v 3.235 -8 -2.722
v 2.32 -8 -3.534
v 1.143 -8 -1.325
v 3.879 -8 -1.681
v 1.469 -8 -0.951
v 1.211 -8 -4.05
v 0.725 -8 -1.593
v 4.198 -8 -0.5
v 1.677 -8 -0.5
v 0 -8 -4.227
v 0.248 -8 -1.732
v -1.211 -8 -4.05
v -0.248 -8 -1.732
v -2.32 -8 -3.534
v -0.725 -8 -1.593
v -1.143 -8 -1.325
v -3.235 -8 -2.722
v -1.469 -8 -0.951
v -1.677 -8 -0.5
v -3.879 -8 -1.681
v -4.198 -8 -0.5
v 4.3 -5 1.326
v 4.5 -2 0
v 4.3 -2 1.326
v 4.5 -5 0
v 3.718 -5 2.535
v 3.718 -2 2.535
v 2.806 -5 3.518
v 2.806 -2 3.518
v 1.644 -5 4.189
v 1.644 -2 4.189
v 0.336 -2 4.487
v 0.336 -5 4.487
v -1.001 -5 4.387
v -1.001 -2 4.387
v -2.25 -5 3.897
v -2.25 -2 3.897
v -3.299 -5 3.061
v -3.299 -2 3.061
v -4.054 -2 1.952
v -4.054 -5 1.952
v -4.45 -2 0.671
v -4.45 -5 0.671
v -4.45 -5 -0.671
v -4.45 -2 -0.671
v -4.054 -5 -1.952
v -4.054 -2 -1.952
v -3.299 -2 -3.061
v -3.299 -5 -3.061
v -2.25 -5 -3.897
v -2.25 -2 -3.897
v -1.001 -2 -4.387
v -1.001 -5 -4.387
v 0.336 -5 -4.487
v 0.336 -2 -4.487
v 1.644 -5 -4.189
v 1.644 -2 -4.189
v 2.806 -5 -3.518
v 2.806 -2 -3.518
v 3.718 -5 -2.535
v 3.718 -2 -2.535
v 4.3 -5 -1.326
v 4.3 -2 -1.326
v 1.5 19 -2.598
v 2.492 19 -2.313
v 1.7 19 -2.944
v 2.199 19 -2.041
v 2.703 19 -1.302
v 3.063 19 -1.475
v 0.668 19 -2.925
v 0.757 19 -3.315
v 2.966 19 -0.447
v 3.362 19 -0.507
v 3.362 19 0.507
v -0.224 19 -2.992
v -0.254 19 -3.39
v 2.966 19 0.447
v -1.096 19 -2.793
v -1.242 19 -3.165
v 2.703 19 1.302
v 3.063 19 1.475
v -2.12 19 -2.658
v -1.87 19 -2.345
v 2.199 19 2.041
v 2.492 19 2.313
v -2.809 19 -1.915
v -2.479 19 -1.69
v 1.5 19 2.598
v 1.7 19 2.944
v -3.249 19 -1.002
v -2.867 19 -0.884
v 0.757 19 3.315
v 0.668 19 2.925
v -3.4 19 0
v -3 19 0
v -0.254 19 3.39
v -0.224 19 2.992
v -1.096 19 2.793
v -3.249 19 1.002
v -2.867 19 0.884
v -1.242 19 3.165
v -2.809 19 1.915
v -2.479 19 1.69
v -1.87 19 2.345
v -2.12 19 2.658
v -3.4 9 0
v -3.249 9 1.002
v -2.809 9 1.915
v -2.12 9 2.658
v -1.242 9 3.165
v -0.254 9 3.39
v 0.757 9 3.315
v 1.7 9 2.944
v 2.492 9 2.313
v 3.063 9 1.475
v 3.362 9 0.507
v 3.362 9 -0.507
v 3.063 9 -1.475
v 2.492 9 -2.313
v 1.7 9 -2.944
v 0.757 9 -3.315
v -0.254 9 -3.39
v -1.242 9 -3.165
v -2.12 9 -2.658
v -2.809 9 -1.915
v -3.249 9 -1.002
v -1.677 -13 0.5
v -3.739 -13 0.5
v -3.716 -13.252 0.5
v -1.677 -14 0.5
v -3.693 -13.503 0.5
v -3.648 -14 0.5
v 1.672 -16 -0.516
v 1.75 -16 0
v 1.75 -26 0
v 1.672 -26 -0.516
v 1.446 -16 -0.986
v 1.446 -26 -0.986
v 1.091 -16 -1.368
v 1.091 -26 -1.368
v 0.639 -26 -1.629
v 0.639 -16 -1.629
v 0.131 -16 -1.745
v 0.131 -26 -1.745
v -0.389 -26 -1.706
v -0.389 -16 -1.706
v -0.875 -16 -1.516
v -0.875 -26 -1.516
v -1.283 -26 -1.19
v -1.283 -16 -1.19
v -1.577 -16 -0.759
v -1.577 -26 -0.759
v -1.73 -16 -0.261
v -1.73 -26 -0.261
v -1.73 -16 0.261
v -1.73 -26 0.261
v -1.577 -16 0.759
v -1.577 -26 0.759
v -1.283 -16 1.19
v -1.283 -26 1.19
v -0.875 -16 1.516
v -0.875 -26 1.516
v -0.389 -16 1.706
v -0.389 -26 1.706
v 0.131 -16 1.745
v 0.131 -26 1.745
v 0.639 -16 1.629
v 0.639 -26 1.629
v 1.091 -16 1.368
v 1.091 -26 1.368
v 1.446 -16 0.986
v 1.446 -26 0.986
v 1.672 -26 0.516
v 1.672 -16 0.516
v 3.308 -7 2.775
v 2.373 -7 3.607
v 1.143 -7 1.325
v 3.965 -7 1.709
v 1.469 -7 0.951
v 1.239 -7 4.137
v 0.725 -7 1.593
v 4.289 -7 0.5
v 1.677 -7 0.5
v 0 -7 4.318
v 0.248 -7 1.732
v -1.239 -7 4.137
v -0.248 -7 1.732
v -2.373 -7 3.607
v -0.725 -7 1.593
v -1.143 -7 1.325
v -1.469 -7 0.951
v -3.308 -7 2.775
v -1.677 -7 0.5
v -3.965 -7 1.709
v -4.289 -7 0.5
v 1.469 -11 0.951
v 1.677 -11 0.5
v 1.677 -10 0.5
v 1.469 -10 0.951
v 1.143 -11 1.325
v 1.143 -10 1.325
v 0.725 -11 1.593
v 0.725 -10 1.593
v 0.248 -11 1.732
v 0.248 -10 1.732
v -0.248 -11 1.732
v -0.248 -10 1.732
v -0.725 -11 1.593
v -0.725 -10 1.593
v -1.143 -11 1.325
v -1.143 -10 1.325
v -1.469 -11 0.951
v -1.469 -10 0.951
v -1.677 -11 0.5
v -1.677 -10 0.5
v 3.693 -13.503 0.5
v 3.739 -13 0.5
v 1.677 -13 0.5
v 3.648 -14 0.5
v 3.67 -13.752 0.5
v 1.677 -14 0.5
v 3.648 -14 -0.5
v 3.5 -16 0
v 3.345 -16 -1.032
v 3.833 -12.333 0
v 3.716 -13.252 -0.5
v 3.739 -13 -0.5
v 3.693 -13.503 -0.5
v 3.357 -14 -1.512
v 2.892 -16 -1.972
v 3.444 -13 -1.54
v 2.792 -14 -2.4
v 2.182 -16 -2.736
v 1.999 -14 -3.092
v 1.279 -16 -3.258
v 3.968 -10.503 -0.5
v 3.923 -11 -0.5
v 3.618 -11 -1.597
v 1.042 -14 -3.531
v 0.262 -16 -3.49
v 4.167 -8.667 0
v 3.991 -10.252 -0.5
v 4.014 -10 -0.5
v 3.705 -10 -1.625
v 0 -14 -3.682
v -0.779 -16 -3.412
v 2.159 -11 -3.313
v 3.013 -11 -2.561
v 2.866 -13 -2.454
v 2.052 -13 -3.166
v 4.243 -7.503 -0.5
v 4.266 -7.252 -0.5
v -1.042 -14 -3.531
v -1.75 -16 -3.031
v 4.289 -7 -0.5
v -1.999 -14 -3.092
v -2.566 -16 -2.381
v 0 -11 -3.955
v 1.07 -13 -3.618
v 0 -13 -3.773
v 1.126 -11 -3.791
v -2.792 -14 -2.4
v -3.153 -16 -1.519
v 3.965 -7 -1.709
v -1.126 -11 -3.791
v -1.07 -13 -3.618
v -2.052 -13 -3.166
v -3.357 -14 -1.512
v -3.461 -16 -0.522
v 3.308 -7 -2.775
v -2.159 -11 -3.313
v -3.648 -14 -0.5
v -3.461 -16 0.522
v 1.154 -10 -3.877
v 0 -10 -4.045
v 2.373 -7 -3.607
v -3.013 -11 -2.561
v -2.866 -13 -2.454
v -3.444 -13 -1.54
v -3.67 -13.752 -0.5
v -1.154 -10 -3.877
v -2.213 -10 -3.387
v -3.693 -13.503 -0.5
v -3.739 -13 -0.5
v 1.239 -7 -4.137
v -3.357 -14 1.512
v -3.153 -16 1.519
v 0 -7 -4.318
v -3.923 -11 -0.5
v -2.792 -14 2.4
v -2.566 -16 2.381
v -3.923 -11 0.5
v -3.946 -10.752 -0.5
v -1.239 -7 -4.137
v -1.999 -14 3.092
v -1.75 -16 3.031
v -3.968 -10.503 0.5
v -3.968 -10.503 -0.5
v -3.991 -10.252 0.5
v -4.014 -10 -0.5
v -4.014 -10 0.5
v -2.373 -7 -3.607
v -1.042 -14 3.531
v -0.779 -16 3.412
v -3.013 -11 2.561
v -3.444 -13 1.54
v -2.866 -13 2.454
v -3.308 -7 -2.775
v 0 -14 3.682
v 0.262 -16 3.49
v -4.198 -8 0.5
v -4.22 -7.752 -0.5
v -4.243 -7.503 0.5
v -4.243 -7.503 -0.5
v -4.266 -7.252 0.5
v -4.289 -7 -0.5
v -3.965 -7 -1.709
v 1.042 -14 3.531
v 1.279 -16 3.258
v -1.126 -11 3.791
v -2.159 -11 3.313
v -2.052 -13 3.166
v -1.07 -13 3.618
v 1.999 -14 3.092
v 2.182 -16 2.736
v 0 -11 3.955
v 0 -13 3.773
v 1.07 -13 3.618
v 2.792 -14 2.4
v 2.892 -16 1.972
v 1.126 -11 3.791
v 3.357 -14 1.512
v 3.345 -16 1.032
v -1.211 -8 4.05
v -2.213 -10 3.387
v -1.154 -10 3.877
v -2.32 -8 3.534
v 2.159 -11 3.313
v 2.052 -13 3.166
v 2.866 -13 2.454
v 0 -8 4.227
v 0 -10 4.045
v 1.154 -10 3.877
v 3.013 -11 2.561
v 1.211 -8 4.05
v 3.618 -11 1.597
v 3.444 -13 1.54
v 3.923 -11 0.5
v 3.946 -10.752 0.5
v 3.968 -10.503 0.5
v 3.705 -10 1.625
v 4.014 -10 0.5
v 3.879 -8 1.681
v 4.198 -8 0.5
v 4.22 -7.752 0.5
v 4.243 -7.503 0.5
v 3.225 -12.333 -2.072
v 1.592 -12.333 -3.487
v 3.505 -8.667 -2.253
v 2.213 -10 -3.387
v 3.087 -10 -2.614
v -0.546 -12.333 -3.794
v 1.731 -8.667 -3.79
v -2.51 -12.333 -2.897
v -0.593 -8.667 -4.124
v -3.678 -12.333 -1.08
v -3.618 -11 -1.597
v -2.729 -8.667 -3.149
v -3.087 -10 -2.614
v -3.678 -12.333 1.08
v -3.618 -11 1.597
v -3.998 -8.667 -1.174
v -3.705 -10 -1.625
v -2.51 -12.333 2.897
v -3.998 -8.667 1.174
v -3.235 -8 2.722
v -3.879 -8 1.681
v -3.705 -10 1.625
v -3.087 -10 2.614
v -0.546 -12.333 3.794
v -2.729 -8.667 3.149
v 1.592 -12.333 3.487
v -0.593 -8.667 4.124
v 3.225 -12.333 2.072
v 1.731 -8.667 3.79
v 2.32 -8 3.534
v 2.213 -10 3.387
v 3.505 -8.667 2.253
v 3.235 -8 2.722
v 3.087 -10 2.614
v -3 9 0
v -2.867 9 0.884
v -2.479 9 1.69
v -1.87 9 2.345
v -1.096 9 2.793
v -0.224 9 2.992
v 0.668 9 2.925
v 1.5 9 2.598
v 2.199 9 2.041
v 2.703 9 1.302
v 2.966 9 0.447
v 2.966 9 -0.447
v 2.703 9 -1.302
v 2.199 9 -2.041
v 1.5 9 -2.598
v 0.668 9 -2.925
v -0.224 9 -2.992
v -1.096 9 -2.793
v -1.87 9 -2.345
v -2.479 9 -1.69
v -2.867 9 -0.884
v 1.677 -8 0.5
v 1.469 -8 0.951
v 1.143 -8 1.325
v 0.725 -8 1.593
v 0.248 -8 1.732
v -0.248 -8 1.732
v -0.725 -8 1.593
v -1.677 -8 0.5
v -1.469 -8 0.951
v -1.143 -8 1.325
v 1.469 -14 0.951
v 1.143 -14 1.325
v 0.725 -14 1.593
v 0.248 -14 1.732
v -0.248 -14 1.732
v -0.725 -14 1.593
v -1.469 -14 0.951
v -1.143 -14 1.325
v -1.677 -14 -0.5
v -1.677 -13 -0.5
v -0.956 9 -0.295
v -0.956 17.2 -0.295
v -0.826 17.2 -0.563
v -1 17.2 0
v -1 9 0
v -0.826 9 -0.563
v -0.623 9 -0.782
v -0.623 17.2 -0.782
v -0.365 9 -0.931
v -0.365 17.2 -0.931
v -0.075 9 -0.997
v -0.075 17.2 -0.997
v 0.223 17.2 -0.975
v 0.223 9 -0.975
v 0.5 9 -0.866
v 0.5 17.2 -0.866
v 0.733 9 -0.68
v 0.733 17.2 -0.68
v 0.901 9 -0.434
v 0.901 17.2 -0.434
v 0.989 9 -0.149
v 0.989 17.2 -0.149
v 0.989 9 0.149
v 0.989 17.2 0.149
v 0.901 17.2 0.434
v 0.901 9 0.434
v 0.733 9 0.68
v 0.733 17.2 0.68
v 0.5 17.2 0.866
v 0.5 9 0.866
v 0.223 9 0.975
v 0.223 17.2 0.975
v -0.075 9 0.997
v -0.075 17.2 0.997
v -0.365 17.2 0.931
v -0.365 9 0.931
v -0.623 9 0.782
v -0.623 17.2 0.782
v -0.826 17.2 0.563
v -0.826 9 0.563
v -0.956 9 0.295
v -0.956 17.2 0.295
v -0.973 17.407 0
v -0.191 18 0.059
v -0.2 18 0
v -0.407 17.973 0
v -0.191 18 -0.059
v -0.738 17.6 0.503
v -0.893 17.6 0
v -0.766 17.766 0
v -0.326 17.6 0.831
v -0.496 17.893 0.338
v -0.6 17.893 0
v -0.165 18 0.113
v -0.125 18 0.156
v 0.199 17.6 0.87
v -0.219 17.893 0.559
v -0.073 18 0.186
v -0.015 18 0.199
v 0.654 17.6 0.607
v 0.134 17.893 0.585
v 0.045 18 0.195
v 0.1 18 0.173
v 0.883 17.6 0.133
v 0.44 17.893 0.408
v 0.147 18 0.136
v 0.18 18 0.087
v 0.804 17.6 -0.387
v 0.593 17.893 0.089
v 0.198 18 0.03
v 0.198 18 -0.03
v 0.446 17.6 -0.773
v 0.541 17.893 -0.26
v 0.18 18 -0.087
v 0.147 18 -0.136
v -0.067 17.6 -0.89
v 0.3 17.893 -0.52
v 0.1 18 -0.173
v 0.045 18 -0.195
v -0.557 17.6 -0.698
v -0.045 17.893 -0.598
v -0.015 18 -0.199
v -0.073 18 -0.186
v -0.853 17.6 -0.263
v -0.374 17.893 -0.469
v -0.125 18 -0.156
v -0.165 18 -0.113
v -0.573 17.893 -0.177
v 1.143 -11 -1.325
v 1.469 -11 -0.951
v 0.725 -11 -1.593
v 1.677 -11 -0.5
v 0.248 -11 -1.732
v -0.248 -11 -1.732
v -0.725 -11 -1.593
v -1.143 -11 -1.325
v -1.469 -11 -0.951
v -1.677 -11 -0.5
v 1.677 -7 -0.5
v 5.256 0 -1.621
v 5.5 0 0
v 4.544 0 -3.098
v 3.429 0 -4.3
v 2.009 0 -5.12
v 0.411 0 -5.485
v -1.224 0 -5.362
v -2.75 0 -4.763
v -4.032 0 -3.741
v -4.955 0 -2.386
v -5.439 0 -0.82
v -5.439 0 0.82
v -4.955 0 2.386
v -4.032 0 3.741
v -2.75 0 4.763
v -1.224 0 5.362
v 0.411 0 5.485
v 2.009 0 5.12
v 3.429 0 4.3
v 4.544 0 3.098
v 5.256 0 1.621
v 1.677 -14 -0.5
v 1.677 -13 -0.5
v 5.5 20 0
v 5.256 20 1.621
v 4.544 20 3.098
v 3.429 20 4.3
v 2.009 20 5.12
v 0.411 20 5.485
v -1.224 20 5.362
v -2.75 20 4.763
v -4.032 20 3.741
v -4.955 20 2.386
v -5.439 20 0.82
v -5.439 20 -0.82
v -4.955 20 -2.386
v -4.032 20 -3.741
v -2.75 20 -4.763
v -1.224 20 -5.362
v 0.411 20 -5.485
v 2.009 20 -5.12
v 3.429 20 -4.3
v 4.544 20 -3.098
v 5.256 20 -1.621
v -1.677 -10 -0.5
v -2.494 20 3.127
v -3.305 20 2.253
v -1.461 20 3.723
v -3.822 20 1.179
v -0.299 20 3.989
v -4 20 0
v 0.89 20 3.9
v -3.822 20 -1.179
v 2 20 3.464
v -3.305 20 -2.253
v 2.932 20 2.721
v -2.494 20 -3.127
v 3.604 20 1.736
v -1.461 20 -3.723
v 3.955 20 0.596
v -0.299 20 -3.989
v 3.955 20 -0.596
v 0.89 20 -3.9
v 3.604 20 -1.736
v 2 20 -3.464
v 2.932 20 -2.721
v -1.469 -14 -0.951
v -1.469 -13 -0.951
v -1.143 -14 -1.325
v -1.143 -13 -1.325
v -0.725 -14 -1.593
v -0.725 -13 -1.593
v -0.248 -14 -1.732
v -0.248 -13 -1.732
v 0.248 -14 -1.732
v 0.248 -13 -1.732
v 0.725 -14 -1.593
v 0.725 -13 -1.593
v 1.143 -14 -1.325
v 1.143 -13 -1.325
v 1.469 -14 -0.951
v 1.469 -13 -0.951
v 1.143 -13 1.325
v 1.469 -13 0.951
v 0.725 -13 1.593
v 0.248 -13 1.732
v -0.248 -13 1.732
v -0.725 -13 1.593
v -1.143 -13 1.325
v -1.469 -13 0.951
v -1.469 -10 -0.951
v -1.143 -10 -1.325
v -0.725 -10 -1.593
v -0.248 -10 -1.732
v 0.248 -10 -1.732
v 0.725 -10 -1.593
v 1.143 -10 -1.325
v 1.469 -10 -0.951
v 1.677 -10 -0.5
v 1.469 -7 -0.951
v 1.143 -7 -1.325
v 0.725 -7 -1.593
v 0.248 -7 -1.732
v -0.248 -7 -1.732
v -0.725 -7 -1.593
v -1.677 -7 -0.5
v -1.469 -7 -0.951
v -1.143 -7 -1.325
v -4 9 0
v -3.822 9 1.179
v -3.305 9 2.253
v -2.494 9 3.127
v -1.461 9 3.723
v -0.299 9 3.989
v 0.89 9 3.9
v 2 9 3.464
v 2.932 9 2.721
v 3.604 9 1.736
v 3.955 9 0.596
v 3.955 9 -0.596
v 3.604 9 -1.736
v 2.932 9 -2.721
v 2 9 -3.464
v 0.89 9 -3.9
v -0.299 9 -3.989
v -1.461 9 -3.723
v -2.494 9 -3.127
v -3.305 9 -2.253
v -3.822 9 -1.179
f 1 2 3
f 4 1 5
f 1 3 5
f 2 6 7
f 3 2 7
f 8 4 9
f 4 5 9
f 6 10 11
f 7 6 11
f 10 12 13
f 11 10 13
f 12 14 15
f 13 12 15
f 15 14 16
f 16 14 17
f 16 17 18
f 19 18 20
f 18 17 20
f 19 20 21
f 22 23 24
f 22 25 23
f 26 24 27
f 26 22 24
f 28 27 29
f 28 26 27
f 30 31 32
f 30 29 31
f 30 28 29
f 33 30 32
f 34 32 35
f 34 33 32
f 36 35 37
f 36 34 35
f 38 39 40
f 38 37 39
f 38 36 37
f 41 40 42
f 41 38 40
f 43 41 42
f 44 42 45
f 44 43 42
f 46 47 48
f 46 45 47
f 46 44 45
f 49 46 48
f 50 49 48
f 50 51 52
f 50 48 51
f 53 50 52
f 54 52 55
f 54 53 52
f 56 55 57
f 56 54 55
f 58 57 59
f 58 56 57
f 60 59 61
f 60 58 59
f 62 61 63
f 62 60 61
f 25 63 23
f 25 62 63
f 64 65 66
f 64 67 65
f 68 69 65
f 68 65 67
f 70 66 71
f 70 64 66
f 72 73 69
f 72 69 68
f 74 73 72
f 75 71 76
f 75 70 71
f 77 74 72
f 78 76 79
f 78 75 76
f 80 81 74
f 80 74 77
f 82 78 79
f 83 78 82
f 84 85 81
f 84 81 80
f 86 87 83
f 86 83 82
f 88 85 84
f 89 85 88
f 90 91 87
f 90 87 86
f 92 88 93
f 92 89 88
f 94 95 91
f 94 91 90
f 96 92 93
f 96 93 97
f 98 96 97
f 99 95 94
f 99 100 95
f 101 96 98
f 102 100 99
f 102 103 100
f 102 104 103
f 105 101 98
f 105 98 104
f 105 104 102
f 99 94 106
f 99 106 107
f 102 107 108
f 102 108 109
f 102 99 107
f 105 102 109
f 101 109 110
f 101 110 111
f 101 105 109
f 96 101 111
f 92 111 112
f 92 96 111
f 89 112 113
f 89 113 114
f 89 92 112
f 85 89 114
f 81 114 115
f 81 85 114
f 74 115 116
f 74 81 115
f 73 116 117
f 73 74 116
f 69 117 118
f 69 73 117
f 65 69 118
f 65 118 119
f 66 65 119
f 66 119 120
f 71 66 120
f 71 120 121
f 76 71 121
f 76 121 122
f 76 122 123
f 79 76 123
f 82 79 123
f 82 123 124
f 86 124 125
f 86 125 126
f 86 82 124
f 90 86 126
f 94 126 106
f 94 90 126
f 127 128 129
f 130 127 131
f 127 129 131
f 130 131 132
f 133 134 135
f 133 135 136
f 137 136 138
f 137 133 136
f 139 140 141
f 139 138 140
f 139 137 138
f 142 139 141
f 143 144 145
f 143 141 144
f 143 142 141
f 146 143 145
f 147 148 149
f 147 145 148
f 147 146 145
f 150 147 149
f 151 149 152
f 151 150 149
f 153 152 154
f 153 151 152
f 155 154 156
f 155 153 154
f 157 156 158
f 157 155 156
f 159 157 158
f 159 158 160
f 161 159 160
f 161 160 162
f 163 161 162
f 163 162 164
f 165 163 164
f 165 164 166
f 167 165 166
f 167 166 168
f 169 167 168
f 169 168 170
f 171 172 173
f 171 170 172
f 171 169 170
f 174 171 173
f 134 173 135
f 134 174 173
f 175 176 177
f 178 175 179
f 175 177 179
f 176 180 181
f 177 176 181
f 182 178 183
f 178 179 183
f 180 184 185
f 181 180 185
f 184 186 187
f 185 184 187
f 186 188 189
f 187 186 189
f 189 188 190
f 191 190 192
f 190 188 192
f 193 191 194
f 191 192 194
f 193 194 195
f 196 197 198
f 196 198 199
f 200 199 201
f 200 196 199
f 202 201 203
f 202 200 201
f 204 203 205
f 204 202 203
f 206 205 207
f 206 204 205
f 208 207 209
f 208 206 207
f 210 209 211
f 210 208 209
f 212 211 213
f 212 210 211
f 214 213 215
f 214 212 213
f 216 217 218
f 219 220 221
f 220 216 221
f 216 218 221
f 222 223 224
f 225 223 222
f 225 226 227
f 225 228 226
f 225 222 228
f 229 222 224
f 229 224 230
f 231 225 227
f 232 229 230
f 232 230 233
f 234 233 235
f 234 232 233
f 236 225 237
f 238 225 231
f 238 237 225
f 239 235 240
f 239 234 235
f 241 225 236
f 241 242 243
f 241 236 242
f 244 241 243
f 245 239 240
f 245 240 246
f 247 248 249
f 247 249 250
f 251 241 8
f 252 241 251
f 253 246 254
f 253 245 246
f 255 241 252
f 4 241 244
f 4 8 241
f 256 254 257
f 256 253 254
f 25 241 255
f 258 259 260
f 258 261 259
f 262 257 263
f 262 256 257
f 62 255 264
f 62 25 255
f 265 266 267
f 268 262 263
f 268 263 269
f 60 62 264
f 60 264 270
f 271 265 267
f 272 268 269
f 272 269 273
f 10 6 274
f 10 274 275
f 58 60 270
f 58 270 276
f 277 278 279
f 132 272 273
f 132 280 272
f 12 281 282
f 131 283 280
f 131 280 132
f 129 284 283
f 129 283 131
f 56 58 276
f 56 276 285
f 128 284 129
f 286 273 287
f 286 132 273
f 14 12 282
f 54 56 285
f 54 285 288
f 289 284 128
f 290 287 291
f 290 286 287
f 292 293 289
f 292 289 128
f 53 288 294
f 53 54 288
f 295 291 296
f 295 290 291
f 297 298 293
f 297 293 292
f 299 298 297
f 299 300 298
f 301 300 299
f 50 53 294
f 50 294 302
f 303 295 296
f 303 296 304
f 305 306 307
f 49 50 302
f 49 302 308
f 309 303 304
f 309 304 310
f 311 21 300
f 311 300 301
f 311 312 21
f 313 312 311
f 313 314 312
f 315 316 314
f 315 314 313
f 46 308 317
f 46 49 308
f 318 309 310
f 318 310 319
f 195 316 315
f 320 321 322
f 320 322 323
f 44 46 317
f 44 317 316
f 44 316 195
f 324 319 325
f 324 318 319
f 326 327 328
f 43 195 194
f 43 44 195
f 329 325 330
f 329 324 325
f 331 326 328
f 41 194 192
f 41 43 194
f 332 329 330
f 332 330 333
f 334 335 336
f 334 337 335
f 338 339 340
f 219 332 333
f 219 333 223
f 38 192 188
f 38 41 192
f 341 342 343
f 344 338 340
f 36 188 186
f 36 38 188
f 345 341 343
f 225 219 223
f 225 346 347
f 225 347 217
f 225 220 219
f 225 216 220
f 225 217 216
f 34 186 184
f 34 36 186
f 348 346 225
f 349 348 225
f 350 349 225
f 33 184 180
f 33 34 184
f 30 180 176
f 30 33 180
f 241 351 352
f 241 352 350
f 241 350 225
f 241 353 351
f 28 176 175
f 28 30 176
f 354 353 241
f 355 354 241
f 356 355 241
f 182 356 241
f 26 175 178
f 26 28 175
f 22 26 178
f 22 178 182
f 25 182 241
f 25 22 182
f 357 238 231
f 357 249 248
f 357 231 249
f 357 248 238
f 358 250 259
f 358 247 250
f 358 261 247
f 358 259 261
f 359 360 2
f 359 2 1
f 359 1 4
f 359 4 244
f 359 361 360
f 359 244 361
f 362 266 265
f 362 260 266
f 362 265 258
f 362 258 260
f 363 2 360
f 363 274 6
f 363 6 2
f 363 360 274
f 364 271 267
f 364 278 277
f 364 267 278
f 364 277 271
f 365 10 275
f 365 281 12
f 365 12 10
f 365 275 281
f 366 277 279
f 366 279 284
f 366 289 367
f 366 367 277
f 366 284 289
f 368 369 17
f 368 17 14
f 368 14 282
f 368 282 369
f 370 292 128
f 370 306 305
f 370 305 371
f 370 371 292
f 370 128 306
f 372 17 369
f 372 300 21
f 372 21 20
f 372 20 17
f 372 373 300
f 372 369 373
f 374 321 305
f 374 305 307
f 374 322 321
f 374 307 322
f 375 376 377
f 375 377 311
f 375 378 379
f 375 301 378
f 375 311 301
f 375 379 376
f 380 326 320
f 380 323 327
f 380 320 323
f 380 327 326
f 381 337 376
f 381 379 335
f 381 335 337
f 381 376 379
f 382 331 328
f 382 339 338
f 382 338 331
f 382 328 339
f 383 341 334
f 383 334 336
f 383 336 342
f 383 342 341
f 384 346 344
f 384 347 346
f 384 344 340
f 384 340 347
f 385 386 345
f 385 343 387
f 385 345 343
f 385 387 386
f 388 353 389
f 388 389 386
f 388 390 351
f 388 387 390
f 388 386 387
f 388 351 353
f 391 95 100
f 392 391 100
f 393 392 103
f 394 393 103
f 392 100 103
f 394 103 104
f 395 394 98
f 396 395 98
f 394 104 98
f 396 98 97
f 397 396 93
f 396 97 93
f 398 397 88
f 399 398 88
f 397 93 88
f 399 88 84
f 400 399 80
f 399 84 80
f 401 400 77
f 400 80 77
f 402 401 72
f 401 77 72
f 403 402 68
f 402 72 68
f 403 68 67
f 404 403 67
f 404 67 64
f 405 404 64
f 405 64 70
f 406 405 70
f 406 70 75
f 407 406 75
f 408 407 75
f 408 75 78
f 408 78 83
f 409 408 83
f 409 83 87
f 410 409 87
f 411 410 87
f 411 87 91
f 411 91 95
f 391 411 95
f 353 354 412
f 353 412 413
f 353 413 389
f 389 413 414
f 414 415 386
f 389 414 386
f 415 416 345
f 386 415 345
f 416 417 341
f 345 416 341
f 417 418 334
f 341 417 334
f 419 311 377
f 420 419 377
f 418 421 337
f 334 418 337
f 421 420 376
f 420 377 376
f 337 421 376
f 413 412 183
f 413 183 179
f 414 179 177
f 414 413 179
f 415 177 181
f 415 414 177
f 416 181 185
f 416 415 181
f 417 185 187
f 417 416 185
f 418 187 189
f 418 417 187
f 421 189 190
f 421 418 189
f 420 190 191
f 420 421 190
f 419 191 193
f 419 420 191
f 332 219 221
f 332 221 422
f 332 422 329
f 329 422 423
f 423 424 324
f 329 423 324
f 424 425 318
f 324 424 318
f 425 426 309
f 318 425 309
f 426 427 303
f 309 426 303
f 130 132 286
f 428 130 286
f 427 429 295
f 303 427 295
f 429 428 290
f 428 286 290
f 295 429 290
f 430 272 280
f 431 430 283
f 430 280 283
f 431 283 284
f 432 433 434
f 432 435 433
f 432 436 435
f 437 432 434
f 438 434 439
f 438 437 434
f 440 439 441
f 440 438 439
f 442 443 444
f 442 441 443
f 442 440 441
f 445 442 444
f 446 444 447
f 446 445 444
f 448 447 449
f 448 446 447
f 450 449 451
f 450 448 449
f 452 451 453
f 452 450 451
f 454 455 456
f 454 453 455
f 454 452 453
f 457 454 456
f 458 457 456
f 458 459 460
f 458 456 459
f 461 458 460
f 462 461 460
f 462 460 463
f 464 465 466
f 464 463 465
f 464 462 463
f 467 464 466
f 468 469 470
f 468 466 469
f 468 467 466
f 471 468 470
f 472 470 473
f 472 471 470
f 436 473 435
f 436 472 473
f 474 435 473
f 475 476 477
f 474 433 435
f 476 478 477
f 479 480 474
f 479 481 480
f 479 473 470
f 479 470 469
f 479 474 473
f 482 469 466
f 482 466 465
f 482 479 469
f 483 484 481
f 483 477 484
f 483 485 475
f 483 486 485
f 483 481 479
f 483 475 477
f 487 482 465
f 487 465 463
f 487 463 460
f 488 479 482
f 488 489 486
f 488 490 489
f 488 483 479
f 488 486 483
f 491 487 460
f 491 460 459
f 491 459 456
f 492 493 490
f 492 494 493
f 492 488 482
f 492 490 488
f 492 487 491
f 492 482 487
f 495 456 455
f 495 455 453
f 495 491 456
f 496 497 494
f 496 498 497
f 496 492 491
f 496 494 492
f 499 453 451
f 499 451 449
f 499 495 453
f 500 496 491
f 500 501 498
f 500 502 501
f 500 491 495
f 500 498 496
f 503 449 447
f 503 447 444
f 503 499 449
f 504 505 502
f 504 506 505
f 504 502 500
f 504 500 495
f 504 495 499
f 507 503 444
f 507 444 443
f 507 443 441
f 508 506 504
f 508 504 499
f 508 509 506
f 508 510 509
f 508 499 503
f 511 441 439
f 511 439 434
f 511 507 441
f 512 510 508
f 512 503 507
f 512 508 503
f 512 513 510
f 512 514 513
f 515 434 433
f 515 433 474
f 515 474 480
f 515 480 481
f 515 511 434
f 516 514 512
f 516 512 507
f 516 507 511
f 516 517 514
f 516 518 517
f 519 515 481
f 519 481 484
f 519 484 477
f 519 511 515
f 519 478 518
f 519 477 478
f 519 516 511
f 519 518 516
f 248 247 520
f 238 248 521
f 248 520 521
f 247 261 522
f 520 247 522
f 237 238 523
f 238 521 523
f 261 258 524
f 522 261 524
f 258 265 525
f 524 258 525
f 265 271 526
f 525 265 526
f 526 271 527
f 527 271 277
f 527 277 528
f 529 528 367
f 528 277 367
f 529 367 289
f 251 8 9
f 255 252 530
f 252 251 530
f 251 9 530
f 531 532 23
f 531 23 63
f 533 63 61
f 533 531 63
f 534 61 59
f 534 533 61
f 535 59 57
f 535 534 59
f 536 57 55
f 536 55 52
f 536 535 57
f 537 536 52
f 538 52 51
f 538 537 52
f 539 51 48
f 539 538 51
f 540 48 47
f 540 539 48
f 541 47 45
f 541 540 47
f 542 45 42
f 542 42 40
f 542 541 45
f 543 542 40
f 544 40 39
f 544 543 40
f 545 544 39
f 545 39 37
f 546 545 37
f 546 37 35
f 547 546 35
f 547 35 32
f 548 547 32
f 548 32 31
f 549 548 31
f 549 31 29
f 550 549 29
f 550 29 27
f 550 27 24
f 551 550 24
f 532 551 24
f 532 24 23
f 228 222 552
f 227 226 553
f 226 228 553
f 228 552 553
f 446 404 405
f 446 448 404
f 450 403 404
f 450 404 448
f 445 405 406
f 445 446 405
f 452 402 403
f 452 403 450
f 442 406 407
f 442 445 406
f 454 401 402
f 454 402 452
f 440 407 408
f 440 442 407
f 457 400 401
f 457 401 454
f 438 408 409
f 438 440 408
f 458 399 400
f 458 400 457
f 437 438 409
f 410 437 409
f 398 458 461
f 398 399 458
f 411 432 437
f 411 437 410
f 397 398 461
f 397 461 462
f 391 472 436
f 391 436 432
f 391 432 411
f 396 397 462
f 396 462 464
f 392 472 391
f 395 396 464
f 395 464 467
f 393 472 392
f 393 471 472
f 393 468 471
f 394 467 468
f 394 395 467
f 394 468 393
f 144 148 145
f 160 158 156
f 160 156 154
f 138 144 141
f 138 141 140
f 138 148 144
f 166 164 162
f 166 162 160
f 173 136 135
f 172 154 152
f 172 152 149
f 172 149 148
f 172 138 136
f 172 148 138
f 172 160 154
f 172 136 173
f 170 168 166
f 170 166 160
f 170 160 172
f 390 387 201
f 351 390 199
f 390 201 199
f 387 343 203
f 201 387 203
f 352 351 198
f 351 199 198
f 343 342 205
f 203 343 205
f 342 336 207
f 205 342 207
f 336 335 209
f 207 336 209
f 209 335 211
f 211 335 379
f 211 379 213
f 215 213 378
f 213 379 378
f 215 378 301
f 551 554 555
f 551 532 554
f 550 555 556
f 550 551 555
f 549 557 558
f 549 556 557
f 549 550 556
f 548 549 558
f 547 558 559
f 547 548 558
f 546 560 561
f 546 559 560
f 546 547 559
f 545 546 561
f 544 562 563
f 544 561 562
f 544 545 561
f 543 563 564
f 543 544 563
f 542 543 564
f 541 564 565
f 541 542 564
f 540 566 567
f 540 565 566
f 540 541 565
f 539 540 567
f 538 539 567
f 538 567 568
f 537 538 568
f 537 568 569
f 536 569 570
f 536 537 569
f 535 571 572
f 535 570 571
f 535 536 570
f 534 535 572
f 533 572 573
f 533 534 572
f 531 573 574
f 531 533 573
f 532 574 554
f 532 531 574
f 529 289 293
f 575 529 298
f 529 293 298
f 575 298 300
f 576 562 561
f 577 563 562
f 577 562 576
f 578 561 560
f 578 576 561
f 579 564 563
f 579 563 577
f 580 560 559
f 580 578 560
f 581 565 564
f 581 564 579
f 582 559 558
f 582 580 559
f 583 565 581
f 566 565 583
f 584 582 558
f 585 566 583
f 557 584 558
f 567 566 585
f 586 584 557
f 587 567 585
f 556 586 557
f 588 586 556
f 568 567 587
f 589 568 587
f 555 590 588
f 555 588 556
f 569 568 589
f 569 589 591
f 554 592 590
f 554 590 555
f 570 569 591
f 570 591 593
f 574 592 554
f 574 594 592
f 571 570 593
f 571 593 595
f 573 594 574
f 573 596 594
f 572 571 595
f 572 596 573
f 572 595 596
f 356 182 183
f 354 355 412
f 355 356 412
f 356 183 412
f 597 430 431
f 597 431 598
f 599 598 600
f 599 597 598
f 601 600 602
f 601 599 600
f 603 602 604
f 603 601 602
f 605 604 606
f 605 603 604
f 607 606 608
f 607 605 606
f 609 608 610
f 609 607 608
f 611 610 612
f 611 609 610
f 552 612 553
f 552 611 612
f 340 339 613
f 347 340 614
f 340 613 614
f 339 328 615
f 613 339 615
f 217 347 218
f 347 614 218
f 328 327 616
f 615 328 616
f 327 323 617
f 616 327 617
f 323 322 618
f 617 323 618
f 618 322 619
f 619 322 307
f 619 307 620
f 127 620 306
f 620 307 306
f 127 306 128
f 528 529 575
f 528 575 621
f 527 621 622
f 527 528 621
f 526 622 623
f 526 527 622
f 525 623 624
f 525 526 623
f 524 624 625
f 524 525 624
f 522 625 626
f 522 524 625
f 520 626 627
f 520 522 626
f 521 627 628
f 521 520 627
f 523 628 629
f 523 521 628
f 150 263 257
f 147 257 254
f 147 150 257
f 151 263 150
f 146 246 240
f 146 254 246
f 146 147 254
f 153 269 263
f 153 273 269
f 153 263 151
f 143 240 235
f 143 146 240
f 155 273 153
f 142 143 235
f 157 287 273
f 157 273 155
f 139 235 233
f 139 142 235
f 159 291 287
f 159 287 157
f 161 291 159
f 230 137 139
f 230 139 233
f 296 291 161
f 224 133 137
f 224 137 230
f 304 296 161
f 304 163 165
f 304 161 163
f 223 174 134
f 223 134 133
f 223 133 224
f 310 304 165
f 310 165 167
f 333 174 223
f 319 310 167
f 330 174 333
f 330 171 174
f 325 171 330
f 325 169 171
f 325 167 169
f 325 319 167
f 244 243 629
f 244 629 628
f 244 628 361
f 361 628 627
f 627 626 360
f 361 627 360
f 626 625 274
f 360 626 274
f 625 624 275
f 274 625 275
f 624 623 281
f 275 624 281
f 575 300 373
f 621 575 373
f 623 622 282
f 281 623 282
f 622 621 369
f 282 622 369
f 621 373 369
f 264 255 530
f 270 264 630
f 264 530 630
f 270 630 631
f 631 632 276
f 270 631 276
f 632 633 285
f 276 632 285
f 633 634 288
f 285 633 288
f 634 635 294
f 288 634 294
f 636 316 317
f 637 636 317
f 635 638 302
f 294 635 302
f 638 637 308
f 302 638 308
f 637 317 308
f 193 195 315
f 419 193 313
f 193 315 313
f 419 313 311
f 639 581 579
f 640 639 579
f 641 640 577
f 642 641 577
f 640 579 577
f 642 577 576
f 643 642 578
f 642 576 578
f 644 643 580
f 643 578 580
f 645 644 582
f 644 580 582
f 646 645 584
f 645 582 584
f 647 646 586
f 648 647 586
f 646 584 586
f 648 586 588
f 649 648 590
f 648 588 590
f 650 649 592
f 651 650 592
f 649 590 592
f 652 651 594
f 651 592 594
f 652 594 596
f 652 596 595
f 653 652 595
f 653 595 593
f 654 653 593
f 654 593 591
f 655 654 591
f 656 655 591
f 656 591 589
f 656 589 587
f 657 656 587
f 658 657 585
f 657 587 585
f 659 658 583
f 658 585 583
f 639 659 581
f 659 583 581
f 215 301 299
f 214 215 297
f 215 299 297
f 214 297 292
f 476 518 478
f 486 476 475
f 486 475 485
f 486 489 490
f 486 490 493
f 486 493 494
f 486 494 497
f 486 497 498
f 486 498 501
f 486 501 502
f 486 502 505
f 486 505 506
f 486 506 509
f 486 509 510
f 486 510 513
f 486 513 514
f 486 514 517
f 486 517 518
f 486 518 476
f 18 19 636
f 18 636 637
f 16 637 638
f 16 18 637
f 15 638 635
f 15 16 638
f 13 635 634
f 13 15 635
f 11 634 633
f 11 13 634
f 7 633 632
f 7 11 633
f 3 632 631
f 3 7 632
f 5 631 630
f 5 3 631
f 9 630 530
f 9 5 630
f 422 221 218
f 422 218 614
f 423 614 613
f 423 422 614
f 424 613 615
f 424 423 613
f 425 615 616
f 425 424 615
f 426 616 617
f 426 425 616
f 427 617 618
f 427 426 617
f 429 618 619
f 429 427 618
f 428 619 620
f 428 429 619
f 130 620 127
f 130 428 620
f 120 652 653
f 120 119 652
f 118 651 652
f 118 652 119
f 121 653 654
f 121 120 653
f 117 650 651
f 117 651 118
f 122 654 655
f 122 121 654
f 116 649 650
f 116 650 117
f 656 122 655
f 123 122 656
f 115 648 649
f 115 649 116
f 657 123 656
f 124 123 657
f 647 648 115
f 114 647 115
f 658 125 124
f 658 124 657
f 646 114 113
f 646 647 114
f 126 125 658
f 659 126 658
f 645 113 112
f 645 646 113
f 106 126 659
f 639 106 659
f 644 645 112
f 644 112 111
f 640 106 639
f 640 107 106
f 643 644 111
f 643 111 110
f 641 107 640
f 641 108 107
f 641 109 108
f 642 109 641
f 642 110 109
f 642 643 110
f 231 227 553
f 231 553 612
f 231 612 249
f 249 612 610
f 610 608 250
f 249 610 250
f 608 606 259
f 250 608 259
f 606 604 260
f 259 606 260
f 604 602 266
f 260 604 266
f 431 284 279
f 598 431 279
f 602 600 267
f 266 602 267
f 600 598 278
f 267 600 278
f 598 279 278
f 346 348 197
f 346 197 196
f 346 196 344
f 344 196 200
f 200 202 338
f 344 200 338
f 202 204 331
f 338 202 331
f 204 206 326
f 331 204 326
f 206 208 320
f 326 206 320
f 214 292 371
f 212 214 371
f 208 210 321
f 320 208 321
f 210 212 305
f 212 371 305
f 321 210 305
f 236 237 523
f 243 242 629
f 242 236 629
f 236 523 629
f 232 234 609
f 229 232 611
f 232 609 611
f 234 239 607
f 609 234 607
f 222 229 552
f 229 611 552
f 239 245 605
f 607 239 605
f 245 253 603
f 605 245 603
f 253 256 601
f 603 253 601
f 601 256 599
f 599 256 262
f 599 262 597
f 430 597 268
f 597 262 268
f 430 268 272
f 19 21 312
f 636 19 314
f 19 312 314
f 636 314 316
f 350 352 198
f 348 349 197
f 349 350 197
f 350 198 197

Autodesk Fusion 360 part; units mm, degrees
sketch "Sketch1" plane through (0, 0, 0) normal (0, 1, 0) x (1, 0, 0)
  circle A0 centre (0, 0) radius 5.5
  dimension "d1" = 11
ref_plane "WorkPlane1" through (0, 20, 0) normal (0, 1, 0) x (1, 0, 0)
sketch "Sketch2" plane through (0, 20, 0) normal (0, 1, 0) x (1, 0, 0)
  circle A0 centre (0, 0) radius 5.5
  dimension "d3" = 11
ref_plane "WorkPlane2" through (0, -2, 0) normal (0, 1, 0) x (1, 0, 0)
sketch "Sketch3" plane through (0, -2, 0) normal (0, 1, 0) x (1, 0, 0)
  circle A0 centre (0, 0) radius 4.5
  dimension "d5" = 9
ref_plane "WorkPlane3" through (0, -5, 0) normal (0, 1, 0) x (1, 0, 0)
sketch "Sketch4" plane through (0, -5, 0) normal (0, 1, 0) x (1, 0, 0)
  circle A0 centre (0, 0) radius 4.5
  dimension "d7" = 9
ref_plane "WorkPlane4" through (0, -16, 0) normal (0, 1, 0) x (1, 0, 0)
sketch "Sketch5" plane through (0, -16, 0) normal (0, 1, 0) x (1, 0, 0)
  circle A0 centre (0, 0) radius 3.5
  dimension "d9" = 7
loft "Loft1" add profiles "Sketch2", "Sketch1" section 1 section 2 makes body 1
loft "Loft2" add profiles "Sketch3" section 1 face at (-1.4907, 0, -0.2732) section 2 on bodies 1 bodies 1
loft "Loft3" add profiles "Sketch4" section 1 face at (0.9352, -2, -1.1727) section 2 on bodies 1 bodies 1
loft "Loft4" add profiles "Sketch5" section 1 face at (0.9352, -5, -1.1727) section 2 on bodies 1 bodies 1
sketch "Sketch6" plane through (0, 0, 0) normal (1, 0, 0) x (0, 1, 0)
  line L0 (-10.5, 5.5424) -> (-10.5, -7.5313)
  line L1 (-5, 0.5) -> (-16, 0.5)
  line L2 (-16, 0.5) -> (-16, -0.5)
  line L3 (-16, -0.5) -> (-5, -0.5)
  line L4 (-5, -0.5) -> (-5, 0.5)
  line L5 (-5, 0.5) -> (-16, -0.5) construction
  line L6 (-16, 0.5) -> (-5, -0.5) construction
  line L7 (-14, 5) -> (-13, 5)
  line L8 (-13, 5) -> (-13, -5)
  line L9 (-13, -5) -> (-14, -5)
  line L10 (-14, -5) -> (-14, 5)
  line L11 (-11, 5) -> (-10, 5)
  line L12 (-10, 5) -> (-10, -5)
  line L13 (-10, -5) -> (-11, -5)
  line L14 (-11, -5) -> (-11, 5)
  line L15 (-8, 5) -> (-7, 5)
  line L16 (-7, 5) -> (-7, -5)
  line L17 (-7, -5) -> (-8, -5)
  line L18 (-8, -5) -> (-8, 5)
  point P0 (-10.5, 0)
  point P1 (-10.5, 0)
  dimension "d10" = 11
  dimension "d11" = 1
extrude "Extrude1" cut sketch "Sketch6" along normal blind 5 and the other way blind 5 contours L0 L1 L11 L12 | L0 L1 L11 L14 | L0 L3 L12 L13 | L0 L3 L13 L14 | L1 L15 L16 L18 | L1 L7 L8 L10 | L3 L8 L9 L10 | L3 L16 L17 L18 bodies 1
sketch "Sketch7" plane through (0, -16, 0) normal (0, -1, 0) x (1, 0, 0)
  circle A0 centre (0, 0) radius 3.5
  circle A1 centre (0, 0) radius 1.75
  dimension "d16" = 3.5
extrude "Extrude2" add sketch "Sketch7" against normal blind 11 contours A1 bodies 1
sketch "Sketch8" plane through (0, 20, 0) normal (0, 1, 0) x (-1, 0, 0)
  circle A0 centre (0, 0) radius 5.5
  circle A1 centre (0, 0) radius 4
  dimension "d19" = 8
extrude "Extrude3" cut sketch "Sketch8" against normal blind 1 contours A1 bodies 1
sketch "Sketch9" plane through (0, 19, 0) normal (0, 1, 0) x (-1, 0, 0)
  circle A0 centre (0, 0) radius 4
  circle A1 centre (0, 0) radius 3
  circle A2 centre (0, 0) radius 3.4
  dimension "d22" = 6
  dimension "d23" = 6.8
extrude "Extrude4" cut sketch "Sketch9" against normal blind 10 bodies 1
sketch "Sketch10" plane through (0, 9, 0) normal (0, 1, 0) x (-1, 0, 0)
  circle A0 centre (0, 0) radius 3
  circle A1 centre (0, 0) radius 1
  dimension "d26" = 2
extrude "Extrude5" add sketch "Sketch10" along normal blind 9 contours A1 bodies 1
fillet "Fillet1" radius 0.8 1 edges at (0.9323, 18, -0.3616) on bodies 1
extrude "Extrude6" add sketch "Sketch7" along normal blind 10 contours A1 bodies 1
copy_body "Body->Comp1" bodies 1 removing the originals makes body 2 in component "Component"
sketch "Sketch11" plane through (0, 0, 0) normal (0, 0, 1) x (1, 0, 0)
  line L0 (10, 20) -> (43, 20)
  line L1 (43, 20) -> (43, -16)
  line L2 (43, -16) -> (10, -16)
  line L3 (10, -16) -> (10, 20)
component "Component" placed x (1, 0, 0) y (0, 1, 0) z (0, 0, 1) at (0, 0, 0)
